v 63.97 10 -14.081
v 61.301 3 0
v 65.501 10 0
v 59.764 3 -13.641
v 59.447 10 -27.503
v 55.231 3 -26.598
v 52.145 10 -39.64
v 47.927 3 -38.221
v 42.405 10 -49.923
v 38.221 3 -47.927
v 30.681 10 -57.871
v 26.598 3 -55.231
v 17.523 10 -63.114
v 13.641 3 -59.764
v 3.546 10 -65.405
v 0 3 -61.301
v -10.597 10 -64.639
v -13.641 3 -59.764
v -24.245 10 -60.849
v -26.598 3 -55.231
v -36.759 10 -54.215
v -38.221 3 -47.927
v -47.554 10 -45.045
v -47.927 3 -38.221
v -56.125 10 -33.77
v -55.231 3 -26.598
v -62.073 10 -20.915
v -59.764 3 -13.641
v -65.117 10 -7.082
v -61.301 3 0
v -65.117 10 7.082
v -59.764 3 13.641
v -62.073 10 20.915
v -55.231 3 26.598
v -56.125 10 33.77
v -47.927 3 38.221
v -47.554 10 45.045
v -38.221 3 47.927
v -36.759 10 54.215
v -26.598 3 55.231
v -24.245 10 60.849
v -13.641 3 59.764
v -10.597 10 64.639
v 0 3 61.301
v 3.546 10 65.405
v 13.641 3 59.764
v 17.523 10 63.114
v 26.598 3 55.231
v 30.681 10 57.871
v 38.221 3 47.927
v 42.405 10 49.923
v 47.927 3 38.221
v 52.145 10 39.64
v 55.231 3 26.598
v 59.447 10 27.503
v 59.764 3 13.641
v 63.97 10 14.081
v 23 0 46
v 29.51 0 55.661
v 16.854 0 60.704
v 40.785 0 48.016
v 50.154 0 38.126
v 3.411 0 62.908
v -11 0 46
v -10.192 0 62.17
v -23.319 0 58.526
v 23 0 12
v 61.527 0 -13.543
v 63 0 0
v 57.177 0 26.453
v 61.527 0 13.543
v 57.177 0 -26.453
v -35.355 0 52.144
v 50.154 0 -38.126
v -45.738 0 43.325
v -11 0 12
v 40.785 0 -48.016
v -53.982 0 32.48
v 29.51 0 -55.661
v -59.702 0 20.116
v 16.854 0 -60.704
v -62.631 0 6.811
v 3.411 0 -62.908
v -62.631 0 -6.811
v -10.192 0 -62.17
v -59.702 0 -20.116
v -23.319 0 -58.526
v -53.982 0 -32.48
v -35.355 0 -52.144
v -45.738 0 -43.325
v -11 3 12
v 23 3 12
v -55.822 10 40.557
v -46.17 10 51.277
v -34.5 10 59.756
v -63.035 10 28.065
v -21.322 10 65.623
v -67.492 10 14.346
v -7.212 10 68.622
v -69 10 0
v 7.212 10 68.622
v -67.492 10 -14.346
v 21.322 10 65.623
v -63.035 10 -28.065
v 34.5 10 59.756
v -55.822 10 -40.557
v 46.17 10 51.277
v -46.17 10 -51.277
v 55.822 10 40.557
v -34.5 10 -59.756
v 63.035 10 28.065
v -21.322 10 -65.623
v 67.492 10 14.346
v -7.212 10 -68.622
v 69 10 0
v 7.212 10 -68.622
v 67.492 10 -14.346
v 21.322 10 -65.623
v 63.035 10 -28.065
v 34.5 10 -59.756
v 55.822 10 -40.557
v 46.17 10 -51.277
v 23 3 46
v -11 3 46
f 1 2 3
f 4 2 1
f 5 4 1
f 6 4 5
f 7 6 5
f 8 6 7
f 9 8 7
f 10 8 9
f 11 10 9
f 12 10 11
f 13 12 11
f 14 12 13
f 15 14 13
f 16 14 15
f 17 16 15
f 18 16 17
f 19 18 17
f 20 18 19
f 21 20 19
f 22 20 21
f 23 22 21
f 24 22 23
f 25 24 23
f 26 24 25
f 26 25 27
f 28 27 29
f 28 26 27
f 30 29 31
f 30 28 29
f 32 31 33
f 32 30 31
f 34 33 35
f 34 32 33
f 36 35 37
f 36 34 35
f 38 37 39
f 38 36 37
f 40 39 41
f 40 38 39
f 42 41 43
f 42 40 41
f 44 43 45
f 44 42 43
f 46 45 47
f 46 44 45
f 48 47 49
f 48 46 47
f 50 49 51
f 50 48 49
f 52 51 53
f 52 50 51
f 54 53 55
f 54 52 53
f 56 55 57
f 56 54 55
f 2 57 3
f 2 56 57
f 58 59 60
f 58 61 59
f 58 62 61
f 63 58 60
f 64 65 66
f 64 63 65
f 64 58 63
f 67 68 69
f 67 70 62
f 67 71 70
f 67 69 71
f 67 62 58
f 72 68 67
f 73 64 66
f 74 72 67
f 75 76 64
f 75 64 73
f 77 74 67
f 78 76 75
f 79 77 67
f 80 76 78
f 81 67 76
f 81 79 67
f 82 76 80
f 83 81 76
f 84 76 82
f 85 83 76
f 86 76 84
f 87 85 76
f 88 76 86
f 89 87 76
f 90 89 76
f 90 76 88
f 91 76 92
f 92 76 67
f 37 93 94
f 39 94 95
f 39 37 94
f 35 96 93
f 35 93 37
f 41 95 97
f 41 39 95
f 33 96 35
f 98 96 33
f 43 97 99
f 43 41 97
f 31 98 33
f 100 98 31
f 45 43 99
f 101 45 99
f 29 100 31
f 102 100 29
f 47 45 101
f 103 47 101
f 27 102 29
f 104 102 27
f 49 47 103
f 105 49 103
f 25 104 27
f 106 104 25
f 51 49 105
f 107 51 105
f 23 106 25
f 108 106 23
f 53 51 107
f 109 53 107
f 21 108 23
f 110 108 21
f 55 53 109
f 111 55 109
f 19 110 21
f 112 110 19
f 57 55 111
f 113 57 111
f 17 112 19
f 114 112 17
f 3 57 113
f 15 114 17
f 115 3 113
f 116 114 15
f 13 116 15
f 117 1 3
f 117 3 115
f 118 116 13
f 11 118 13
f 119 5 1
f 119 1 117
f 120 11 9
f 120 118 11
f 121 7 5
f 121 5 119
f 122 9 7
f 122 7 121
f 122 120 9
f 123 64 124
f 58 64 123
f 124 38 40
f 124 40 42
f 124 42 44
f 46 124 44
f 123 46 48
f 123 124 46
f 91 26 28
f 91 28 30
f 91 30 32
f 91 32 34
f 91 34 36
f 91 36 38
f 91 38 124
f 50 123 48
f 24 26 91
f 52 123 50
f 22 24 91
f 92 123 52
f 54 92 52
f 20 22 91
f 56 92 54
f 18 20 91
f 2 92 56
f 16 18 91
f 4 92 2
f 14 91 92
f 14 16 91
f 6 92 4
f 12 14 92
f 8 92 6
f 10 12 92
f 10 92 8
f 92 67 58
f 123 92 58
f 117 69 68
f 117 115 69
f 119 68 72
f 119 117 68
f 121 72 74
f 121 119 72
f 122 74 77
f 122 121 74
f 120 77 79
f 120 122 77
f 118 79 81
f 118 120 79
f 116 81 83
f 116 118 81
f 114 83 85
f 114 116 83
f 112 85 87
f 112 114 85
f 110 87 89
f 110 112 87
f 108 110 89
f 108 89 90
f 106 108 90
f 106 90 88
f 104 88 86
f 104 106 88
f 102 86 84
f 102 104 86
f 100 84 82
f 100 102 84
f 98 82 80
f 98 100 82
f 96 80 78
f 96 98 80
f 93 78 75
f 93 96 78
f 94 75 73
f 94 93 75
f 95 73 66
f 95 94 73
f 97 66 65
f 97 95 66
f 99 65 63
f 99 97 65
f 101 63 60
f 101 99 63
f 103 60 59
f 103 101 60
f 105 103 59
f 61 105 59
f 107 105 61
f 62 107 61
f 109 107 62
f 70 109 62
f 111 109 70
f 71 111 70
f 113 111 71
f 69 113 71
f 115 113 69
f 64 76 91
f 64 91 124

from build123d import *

# Parameters (mm, degrees)
SKETCH2_W          = 34
SKETCH2_H          = 34
CUT_EXTRUDE1_DEPTH = 11


with BuildPart() as part:
    # Sketch1 → Revolve1 (revolve)
    with BuildSketch(Plane.XY):
        Polygon((0, 0), (63, 0), (69, 10), (65.501428863, 10), (61.301428863, 3), (0, 3), align=None)
    revolve(axis=Axis((0, 0, 0), (0, 1, 0)))

    # Sketch2 → Cut-Extrude1 (cut, through all)
    with BuildSketch(Plane.XZ):
        with Locations((6, 29)):
            Rectangle(SKETCH2_W, SKETCH2_H)
    extrude(amount=-CUT_EXTRUDE1_DEPTH, mode=Mode.SUBTRACT)


solid = part.part
